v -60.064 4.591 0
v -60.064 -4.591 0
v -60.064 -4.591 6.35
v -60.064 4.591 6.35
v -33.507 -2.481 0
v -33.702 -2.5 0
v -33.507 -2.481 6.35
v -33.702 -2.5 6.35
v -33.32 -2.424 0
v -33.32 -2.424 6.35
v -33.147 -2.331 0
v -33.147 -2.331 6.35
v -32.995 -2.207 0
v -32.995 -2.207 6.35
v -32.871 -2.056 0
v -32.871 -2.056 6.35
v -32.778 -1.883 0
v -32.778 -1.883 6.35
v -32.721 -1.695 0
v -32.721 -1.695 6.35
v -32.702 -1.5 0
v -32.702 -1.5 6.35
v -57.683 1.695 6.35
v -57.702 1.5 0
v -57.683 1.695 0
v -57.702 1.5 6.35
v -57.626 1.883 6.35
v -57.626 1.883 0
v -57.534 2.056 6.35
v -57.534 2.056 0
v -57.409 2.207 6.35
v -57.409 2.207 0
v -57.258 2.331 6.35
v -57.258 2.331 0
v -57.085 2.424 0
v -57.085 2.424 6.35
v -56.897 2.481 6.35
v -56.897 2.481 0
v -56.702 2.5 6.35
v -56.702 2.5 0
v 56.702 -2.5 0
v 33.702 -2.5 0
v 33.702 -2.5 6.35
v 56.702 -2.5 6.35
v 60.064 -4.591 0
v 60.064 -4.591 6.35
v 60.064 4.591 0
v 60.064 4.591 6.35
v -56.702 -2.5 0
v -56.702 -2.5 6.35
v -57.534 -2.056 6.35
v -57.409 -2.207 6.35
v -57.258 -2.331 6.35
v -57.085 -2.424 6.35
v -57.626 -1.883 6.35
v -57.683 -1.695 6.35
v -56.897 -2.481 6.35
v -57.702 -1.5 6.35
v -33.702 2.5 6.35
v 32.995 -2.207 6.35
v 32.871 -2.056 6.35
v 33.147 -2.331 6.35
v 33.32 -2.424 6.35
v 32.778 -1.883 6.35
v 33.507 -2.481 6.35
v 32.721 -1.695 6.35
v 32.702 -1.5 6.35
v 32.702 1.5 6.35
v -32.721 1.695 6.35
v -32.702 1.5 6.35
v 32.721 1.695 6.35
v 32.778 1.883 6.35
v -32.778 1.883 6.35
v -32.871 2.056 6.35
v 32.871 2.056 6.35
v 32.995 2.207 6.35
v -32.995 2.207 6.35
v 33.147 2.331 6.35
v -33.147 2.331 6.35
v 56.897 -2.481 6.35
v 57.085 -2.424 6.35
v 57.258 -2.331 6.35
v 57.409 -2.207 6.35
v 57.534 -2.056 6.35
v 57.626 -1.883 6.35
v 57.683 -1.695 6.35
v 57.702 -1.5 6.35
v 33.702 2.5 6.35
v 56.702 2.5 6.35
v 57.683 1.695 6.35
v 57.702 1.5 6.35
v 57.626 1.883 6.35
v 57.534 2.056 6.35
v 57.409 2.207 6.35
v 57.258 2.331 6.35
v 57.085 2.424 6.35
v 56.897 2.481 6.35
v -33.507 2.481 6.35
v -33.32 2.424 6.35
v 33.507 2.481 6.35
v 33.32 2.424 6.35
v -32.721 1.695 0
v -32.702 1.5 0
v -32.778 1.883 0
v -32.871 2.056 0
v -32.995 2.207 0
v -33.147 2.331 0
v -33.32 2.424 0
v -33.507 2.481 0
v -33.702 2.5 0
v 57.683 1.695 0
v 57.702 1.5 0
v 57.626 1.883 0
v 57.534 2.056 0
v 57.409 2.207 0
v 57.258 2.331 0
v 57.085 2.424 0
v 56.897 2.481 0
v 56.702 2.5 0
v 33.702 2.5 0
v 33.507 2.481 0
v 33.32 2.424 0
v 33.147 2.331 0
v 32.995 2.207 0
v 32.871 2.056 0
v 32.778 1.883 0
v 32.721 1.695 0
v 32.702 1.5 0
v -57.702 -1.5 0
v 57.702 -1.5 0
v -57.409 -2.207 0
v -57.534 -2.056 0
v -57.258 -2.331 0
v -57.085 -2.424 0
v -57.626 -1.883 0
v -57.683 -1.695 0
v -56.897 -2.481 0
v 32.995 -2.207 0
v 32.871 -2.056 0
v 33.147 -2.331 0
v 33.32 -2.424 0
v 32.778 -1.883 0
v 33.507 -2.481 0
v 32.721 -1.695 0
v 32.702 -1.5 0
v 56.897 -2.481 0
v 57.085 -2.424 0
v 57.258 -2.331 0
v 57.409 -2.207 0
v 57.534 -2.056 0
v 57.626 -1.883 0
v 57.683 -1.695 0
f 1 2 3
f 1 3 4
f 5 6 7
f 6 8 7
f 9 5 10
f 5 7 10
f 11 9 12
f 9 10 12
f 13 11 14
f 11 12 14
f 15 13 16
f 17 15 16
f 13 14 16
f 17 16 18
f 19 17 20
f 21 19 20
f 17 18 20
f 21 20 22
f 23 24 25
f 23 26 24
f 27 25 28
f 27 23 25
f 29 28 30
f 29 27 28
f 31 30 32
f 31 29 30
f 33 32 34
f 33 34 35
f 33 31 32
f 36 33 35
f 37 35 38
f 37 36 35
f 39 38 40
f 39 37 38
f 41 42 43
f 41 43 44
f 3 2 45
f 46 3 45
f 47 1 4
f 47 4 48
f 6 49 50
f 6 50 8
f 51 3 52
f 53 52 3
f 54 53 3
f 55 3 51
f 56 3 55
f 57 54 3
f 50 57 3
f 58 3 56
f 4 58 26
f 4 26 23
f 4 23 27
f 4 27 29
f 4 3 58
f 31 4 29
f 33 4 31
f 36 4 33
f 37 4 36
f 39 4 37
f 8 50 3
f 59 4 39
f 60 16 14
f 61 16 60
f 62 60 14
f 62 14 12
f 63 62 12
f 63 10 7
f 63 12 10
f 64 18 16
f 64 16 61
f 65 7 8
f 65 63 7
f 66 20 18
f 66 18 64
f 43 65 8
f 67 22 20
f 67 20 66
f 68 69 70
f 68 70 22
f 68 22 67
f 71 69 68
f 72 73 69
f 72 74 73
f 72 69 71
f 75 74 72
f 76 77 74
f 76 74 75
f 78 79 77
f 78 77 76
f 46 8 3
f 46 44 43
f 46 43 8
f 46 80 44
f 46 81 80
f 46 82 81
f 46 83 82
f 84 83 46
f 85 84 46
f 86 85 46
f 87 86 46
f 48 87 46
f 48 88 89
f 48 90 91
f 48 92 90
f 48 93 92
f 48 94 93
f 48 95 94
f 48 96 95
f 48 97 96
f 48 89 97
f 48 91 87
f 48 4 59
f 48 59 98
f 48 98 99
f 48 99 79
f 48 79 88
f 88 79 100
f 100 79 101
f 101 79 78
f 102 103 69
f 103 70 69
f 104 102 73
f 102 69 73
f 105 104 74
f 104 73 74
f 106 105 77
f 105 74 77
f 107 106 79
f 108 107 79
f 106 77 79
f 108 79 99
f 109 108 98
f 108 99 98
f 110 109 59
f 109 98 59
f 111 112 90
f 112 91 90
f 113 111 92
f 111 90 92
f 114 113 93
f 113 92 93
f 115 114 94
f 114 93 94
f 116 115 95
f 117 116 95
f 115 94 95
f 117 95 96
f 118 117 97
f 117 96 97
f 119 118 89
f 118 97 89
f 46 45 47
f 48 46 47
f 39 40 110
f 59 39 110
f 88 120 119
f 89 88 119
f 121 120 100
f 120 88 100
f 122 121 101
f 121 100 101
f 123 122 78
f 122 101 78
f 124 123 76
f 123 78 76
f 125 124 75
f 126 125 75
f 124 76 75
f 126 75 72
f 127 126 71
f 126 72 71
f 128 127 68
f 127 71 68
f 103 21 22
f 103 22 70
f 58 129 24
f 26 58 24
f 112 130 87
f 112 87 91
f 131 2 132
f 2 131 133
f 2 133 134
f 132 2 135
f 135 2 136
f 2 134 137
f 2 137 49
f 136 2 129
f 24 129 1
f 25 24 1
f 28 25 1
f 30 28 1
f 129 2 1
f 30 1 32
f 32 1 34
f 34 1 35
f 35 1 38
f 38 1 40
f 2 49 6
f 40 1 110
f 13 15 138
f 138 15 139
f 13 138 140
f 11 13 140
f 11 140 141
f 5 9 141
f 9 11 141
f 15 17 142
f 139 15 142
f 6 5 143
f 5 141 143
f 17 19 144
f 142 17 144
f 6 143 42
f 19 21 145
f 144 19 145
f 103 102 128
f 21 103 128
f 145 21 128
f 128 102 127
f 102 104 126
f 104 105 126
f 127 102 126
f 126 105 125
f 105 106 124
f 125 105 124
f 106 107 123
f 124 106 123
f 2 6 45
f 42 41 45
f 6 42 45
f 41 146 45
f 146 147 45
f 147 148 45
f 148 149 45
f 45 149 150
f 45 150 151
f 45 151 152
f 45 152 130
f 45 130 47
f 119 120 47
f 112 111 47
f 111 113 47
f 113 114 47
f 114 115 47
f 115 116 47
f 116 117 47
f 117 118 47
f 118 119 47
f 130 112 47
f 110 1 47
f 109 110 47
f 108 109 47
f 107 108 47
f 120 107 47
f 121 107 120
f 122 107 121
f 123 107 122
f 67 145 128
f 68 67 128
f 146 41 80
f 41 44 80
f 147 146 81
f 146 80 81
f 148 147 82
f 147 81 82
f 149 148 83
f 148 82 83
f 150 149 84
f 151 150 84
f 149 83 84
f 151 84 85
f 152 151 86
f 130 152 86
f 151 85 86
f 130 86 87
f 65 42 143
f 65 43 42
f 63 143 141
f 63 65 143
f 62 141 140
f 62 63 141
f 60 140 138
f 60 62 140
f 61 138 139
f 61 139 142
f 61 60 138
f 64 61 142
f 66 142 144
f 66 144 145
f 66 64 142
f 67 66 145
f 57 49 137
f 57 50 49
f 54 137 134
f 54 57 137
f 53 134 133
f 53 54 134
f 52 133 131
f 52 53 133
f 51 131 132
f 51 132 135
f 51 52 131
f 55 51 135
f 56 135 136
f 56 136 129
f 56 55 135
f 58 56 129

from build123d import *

# Parameters (mm, degrees)
F0_W     = 120.127284
F0_H     = 9.181094
F0_W_2   = 25
F0_H_2   = 5
F1_DEPTH = 6.35
F2_R     = 1


with BuildPart() as f1:
    # F0 (on Top) → F1 (new body)
    with BuildSketch(Plane.XY):
        Rectangle(F0_W, F0_H)
        with Locations((-45.202259, 0)):
            Rectangle(F0_W_2, F0_H_2, mode=Mode.SUBTRACT)
        with Locations((45.202259, 0)):
            Rectangle(F0_W_2, F0_H_2, mode=Mode.SUBTRACT)
    extrude(amount=F1_DEPTH)

    # F2
    f2_edges = [f1.edges().sort_by_distance(p)[0] for p in [
        (-57.702259, 2.5, 3.175),
        (-57.702259, -2.5, 3.175),
        (57.702259, 2.5, 3.175),
        (57.702259, -2.5, 3.175),
        (32.702259, -2.5, 3.175),
        (32.702259, 2.5, 3.175),
        (-32.702259, -2.5, 3.175),
        (-32.702259, 2.5, 3.175),
    ]]
    fillet(f2_edges, radius=F2_R)


solid = f1.part
